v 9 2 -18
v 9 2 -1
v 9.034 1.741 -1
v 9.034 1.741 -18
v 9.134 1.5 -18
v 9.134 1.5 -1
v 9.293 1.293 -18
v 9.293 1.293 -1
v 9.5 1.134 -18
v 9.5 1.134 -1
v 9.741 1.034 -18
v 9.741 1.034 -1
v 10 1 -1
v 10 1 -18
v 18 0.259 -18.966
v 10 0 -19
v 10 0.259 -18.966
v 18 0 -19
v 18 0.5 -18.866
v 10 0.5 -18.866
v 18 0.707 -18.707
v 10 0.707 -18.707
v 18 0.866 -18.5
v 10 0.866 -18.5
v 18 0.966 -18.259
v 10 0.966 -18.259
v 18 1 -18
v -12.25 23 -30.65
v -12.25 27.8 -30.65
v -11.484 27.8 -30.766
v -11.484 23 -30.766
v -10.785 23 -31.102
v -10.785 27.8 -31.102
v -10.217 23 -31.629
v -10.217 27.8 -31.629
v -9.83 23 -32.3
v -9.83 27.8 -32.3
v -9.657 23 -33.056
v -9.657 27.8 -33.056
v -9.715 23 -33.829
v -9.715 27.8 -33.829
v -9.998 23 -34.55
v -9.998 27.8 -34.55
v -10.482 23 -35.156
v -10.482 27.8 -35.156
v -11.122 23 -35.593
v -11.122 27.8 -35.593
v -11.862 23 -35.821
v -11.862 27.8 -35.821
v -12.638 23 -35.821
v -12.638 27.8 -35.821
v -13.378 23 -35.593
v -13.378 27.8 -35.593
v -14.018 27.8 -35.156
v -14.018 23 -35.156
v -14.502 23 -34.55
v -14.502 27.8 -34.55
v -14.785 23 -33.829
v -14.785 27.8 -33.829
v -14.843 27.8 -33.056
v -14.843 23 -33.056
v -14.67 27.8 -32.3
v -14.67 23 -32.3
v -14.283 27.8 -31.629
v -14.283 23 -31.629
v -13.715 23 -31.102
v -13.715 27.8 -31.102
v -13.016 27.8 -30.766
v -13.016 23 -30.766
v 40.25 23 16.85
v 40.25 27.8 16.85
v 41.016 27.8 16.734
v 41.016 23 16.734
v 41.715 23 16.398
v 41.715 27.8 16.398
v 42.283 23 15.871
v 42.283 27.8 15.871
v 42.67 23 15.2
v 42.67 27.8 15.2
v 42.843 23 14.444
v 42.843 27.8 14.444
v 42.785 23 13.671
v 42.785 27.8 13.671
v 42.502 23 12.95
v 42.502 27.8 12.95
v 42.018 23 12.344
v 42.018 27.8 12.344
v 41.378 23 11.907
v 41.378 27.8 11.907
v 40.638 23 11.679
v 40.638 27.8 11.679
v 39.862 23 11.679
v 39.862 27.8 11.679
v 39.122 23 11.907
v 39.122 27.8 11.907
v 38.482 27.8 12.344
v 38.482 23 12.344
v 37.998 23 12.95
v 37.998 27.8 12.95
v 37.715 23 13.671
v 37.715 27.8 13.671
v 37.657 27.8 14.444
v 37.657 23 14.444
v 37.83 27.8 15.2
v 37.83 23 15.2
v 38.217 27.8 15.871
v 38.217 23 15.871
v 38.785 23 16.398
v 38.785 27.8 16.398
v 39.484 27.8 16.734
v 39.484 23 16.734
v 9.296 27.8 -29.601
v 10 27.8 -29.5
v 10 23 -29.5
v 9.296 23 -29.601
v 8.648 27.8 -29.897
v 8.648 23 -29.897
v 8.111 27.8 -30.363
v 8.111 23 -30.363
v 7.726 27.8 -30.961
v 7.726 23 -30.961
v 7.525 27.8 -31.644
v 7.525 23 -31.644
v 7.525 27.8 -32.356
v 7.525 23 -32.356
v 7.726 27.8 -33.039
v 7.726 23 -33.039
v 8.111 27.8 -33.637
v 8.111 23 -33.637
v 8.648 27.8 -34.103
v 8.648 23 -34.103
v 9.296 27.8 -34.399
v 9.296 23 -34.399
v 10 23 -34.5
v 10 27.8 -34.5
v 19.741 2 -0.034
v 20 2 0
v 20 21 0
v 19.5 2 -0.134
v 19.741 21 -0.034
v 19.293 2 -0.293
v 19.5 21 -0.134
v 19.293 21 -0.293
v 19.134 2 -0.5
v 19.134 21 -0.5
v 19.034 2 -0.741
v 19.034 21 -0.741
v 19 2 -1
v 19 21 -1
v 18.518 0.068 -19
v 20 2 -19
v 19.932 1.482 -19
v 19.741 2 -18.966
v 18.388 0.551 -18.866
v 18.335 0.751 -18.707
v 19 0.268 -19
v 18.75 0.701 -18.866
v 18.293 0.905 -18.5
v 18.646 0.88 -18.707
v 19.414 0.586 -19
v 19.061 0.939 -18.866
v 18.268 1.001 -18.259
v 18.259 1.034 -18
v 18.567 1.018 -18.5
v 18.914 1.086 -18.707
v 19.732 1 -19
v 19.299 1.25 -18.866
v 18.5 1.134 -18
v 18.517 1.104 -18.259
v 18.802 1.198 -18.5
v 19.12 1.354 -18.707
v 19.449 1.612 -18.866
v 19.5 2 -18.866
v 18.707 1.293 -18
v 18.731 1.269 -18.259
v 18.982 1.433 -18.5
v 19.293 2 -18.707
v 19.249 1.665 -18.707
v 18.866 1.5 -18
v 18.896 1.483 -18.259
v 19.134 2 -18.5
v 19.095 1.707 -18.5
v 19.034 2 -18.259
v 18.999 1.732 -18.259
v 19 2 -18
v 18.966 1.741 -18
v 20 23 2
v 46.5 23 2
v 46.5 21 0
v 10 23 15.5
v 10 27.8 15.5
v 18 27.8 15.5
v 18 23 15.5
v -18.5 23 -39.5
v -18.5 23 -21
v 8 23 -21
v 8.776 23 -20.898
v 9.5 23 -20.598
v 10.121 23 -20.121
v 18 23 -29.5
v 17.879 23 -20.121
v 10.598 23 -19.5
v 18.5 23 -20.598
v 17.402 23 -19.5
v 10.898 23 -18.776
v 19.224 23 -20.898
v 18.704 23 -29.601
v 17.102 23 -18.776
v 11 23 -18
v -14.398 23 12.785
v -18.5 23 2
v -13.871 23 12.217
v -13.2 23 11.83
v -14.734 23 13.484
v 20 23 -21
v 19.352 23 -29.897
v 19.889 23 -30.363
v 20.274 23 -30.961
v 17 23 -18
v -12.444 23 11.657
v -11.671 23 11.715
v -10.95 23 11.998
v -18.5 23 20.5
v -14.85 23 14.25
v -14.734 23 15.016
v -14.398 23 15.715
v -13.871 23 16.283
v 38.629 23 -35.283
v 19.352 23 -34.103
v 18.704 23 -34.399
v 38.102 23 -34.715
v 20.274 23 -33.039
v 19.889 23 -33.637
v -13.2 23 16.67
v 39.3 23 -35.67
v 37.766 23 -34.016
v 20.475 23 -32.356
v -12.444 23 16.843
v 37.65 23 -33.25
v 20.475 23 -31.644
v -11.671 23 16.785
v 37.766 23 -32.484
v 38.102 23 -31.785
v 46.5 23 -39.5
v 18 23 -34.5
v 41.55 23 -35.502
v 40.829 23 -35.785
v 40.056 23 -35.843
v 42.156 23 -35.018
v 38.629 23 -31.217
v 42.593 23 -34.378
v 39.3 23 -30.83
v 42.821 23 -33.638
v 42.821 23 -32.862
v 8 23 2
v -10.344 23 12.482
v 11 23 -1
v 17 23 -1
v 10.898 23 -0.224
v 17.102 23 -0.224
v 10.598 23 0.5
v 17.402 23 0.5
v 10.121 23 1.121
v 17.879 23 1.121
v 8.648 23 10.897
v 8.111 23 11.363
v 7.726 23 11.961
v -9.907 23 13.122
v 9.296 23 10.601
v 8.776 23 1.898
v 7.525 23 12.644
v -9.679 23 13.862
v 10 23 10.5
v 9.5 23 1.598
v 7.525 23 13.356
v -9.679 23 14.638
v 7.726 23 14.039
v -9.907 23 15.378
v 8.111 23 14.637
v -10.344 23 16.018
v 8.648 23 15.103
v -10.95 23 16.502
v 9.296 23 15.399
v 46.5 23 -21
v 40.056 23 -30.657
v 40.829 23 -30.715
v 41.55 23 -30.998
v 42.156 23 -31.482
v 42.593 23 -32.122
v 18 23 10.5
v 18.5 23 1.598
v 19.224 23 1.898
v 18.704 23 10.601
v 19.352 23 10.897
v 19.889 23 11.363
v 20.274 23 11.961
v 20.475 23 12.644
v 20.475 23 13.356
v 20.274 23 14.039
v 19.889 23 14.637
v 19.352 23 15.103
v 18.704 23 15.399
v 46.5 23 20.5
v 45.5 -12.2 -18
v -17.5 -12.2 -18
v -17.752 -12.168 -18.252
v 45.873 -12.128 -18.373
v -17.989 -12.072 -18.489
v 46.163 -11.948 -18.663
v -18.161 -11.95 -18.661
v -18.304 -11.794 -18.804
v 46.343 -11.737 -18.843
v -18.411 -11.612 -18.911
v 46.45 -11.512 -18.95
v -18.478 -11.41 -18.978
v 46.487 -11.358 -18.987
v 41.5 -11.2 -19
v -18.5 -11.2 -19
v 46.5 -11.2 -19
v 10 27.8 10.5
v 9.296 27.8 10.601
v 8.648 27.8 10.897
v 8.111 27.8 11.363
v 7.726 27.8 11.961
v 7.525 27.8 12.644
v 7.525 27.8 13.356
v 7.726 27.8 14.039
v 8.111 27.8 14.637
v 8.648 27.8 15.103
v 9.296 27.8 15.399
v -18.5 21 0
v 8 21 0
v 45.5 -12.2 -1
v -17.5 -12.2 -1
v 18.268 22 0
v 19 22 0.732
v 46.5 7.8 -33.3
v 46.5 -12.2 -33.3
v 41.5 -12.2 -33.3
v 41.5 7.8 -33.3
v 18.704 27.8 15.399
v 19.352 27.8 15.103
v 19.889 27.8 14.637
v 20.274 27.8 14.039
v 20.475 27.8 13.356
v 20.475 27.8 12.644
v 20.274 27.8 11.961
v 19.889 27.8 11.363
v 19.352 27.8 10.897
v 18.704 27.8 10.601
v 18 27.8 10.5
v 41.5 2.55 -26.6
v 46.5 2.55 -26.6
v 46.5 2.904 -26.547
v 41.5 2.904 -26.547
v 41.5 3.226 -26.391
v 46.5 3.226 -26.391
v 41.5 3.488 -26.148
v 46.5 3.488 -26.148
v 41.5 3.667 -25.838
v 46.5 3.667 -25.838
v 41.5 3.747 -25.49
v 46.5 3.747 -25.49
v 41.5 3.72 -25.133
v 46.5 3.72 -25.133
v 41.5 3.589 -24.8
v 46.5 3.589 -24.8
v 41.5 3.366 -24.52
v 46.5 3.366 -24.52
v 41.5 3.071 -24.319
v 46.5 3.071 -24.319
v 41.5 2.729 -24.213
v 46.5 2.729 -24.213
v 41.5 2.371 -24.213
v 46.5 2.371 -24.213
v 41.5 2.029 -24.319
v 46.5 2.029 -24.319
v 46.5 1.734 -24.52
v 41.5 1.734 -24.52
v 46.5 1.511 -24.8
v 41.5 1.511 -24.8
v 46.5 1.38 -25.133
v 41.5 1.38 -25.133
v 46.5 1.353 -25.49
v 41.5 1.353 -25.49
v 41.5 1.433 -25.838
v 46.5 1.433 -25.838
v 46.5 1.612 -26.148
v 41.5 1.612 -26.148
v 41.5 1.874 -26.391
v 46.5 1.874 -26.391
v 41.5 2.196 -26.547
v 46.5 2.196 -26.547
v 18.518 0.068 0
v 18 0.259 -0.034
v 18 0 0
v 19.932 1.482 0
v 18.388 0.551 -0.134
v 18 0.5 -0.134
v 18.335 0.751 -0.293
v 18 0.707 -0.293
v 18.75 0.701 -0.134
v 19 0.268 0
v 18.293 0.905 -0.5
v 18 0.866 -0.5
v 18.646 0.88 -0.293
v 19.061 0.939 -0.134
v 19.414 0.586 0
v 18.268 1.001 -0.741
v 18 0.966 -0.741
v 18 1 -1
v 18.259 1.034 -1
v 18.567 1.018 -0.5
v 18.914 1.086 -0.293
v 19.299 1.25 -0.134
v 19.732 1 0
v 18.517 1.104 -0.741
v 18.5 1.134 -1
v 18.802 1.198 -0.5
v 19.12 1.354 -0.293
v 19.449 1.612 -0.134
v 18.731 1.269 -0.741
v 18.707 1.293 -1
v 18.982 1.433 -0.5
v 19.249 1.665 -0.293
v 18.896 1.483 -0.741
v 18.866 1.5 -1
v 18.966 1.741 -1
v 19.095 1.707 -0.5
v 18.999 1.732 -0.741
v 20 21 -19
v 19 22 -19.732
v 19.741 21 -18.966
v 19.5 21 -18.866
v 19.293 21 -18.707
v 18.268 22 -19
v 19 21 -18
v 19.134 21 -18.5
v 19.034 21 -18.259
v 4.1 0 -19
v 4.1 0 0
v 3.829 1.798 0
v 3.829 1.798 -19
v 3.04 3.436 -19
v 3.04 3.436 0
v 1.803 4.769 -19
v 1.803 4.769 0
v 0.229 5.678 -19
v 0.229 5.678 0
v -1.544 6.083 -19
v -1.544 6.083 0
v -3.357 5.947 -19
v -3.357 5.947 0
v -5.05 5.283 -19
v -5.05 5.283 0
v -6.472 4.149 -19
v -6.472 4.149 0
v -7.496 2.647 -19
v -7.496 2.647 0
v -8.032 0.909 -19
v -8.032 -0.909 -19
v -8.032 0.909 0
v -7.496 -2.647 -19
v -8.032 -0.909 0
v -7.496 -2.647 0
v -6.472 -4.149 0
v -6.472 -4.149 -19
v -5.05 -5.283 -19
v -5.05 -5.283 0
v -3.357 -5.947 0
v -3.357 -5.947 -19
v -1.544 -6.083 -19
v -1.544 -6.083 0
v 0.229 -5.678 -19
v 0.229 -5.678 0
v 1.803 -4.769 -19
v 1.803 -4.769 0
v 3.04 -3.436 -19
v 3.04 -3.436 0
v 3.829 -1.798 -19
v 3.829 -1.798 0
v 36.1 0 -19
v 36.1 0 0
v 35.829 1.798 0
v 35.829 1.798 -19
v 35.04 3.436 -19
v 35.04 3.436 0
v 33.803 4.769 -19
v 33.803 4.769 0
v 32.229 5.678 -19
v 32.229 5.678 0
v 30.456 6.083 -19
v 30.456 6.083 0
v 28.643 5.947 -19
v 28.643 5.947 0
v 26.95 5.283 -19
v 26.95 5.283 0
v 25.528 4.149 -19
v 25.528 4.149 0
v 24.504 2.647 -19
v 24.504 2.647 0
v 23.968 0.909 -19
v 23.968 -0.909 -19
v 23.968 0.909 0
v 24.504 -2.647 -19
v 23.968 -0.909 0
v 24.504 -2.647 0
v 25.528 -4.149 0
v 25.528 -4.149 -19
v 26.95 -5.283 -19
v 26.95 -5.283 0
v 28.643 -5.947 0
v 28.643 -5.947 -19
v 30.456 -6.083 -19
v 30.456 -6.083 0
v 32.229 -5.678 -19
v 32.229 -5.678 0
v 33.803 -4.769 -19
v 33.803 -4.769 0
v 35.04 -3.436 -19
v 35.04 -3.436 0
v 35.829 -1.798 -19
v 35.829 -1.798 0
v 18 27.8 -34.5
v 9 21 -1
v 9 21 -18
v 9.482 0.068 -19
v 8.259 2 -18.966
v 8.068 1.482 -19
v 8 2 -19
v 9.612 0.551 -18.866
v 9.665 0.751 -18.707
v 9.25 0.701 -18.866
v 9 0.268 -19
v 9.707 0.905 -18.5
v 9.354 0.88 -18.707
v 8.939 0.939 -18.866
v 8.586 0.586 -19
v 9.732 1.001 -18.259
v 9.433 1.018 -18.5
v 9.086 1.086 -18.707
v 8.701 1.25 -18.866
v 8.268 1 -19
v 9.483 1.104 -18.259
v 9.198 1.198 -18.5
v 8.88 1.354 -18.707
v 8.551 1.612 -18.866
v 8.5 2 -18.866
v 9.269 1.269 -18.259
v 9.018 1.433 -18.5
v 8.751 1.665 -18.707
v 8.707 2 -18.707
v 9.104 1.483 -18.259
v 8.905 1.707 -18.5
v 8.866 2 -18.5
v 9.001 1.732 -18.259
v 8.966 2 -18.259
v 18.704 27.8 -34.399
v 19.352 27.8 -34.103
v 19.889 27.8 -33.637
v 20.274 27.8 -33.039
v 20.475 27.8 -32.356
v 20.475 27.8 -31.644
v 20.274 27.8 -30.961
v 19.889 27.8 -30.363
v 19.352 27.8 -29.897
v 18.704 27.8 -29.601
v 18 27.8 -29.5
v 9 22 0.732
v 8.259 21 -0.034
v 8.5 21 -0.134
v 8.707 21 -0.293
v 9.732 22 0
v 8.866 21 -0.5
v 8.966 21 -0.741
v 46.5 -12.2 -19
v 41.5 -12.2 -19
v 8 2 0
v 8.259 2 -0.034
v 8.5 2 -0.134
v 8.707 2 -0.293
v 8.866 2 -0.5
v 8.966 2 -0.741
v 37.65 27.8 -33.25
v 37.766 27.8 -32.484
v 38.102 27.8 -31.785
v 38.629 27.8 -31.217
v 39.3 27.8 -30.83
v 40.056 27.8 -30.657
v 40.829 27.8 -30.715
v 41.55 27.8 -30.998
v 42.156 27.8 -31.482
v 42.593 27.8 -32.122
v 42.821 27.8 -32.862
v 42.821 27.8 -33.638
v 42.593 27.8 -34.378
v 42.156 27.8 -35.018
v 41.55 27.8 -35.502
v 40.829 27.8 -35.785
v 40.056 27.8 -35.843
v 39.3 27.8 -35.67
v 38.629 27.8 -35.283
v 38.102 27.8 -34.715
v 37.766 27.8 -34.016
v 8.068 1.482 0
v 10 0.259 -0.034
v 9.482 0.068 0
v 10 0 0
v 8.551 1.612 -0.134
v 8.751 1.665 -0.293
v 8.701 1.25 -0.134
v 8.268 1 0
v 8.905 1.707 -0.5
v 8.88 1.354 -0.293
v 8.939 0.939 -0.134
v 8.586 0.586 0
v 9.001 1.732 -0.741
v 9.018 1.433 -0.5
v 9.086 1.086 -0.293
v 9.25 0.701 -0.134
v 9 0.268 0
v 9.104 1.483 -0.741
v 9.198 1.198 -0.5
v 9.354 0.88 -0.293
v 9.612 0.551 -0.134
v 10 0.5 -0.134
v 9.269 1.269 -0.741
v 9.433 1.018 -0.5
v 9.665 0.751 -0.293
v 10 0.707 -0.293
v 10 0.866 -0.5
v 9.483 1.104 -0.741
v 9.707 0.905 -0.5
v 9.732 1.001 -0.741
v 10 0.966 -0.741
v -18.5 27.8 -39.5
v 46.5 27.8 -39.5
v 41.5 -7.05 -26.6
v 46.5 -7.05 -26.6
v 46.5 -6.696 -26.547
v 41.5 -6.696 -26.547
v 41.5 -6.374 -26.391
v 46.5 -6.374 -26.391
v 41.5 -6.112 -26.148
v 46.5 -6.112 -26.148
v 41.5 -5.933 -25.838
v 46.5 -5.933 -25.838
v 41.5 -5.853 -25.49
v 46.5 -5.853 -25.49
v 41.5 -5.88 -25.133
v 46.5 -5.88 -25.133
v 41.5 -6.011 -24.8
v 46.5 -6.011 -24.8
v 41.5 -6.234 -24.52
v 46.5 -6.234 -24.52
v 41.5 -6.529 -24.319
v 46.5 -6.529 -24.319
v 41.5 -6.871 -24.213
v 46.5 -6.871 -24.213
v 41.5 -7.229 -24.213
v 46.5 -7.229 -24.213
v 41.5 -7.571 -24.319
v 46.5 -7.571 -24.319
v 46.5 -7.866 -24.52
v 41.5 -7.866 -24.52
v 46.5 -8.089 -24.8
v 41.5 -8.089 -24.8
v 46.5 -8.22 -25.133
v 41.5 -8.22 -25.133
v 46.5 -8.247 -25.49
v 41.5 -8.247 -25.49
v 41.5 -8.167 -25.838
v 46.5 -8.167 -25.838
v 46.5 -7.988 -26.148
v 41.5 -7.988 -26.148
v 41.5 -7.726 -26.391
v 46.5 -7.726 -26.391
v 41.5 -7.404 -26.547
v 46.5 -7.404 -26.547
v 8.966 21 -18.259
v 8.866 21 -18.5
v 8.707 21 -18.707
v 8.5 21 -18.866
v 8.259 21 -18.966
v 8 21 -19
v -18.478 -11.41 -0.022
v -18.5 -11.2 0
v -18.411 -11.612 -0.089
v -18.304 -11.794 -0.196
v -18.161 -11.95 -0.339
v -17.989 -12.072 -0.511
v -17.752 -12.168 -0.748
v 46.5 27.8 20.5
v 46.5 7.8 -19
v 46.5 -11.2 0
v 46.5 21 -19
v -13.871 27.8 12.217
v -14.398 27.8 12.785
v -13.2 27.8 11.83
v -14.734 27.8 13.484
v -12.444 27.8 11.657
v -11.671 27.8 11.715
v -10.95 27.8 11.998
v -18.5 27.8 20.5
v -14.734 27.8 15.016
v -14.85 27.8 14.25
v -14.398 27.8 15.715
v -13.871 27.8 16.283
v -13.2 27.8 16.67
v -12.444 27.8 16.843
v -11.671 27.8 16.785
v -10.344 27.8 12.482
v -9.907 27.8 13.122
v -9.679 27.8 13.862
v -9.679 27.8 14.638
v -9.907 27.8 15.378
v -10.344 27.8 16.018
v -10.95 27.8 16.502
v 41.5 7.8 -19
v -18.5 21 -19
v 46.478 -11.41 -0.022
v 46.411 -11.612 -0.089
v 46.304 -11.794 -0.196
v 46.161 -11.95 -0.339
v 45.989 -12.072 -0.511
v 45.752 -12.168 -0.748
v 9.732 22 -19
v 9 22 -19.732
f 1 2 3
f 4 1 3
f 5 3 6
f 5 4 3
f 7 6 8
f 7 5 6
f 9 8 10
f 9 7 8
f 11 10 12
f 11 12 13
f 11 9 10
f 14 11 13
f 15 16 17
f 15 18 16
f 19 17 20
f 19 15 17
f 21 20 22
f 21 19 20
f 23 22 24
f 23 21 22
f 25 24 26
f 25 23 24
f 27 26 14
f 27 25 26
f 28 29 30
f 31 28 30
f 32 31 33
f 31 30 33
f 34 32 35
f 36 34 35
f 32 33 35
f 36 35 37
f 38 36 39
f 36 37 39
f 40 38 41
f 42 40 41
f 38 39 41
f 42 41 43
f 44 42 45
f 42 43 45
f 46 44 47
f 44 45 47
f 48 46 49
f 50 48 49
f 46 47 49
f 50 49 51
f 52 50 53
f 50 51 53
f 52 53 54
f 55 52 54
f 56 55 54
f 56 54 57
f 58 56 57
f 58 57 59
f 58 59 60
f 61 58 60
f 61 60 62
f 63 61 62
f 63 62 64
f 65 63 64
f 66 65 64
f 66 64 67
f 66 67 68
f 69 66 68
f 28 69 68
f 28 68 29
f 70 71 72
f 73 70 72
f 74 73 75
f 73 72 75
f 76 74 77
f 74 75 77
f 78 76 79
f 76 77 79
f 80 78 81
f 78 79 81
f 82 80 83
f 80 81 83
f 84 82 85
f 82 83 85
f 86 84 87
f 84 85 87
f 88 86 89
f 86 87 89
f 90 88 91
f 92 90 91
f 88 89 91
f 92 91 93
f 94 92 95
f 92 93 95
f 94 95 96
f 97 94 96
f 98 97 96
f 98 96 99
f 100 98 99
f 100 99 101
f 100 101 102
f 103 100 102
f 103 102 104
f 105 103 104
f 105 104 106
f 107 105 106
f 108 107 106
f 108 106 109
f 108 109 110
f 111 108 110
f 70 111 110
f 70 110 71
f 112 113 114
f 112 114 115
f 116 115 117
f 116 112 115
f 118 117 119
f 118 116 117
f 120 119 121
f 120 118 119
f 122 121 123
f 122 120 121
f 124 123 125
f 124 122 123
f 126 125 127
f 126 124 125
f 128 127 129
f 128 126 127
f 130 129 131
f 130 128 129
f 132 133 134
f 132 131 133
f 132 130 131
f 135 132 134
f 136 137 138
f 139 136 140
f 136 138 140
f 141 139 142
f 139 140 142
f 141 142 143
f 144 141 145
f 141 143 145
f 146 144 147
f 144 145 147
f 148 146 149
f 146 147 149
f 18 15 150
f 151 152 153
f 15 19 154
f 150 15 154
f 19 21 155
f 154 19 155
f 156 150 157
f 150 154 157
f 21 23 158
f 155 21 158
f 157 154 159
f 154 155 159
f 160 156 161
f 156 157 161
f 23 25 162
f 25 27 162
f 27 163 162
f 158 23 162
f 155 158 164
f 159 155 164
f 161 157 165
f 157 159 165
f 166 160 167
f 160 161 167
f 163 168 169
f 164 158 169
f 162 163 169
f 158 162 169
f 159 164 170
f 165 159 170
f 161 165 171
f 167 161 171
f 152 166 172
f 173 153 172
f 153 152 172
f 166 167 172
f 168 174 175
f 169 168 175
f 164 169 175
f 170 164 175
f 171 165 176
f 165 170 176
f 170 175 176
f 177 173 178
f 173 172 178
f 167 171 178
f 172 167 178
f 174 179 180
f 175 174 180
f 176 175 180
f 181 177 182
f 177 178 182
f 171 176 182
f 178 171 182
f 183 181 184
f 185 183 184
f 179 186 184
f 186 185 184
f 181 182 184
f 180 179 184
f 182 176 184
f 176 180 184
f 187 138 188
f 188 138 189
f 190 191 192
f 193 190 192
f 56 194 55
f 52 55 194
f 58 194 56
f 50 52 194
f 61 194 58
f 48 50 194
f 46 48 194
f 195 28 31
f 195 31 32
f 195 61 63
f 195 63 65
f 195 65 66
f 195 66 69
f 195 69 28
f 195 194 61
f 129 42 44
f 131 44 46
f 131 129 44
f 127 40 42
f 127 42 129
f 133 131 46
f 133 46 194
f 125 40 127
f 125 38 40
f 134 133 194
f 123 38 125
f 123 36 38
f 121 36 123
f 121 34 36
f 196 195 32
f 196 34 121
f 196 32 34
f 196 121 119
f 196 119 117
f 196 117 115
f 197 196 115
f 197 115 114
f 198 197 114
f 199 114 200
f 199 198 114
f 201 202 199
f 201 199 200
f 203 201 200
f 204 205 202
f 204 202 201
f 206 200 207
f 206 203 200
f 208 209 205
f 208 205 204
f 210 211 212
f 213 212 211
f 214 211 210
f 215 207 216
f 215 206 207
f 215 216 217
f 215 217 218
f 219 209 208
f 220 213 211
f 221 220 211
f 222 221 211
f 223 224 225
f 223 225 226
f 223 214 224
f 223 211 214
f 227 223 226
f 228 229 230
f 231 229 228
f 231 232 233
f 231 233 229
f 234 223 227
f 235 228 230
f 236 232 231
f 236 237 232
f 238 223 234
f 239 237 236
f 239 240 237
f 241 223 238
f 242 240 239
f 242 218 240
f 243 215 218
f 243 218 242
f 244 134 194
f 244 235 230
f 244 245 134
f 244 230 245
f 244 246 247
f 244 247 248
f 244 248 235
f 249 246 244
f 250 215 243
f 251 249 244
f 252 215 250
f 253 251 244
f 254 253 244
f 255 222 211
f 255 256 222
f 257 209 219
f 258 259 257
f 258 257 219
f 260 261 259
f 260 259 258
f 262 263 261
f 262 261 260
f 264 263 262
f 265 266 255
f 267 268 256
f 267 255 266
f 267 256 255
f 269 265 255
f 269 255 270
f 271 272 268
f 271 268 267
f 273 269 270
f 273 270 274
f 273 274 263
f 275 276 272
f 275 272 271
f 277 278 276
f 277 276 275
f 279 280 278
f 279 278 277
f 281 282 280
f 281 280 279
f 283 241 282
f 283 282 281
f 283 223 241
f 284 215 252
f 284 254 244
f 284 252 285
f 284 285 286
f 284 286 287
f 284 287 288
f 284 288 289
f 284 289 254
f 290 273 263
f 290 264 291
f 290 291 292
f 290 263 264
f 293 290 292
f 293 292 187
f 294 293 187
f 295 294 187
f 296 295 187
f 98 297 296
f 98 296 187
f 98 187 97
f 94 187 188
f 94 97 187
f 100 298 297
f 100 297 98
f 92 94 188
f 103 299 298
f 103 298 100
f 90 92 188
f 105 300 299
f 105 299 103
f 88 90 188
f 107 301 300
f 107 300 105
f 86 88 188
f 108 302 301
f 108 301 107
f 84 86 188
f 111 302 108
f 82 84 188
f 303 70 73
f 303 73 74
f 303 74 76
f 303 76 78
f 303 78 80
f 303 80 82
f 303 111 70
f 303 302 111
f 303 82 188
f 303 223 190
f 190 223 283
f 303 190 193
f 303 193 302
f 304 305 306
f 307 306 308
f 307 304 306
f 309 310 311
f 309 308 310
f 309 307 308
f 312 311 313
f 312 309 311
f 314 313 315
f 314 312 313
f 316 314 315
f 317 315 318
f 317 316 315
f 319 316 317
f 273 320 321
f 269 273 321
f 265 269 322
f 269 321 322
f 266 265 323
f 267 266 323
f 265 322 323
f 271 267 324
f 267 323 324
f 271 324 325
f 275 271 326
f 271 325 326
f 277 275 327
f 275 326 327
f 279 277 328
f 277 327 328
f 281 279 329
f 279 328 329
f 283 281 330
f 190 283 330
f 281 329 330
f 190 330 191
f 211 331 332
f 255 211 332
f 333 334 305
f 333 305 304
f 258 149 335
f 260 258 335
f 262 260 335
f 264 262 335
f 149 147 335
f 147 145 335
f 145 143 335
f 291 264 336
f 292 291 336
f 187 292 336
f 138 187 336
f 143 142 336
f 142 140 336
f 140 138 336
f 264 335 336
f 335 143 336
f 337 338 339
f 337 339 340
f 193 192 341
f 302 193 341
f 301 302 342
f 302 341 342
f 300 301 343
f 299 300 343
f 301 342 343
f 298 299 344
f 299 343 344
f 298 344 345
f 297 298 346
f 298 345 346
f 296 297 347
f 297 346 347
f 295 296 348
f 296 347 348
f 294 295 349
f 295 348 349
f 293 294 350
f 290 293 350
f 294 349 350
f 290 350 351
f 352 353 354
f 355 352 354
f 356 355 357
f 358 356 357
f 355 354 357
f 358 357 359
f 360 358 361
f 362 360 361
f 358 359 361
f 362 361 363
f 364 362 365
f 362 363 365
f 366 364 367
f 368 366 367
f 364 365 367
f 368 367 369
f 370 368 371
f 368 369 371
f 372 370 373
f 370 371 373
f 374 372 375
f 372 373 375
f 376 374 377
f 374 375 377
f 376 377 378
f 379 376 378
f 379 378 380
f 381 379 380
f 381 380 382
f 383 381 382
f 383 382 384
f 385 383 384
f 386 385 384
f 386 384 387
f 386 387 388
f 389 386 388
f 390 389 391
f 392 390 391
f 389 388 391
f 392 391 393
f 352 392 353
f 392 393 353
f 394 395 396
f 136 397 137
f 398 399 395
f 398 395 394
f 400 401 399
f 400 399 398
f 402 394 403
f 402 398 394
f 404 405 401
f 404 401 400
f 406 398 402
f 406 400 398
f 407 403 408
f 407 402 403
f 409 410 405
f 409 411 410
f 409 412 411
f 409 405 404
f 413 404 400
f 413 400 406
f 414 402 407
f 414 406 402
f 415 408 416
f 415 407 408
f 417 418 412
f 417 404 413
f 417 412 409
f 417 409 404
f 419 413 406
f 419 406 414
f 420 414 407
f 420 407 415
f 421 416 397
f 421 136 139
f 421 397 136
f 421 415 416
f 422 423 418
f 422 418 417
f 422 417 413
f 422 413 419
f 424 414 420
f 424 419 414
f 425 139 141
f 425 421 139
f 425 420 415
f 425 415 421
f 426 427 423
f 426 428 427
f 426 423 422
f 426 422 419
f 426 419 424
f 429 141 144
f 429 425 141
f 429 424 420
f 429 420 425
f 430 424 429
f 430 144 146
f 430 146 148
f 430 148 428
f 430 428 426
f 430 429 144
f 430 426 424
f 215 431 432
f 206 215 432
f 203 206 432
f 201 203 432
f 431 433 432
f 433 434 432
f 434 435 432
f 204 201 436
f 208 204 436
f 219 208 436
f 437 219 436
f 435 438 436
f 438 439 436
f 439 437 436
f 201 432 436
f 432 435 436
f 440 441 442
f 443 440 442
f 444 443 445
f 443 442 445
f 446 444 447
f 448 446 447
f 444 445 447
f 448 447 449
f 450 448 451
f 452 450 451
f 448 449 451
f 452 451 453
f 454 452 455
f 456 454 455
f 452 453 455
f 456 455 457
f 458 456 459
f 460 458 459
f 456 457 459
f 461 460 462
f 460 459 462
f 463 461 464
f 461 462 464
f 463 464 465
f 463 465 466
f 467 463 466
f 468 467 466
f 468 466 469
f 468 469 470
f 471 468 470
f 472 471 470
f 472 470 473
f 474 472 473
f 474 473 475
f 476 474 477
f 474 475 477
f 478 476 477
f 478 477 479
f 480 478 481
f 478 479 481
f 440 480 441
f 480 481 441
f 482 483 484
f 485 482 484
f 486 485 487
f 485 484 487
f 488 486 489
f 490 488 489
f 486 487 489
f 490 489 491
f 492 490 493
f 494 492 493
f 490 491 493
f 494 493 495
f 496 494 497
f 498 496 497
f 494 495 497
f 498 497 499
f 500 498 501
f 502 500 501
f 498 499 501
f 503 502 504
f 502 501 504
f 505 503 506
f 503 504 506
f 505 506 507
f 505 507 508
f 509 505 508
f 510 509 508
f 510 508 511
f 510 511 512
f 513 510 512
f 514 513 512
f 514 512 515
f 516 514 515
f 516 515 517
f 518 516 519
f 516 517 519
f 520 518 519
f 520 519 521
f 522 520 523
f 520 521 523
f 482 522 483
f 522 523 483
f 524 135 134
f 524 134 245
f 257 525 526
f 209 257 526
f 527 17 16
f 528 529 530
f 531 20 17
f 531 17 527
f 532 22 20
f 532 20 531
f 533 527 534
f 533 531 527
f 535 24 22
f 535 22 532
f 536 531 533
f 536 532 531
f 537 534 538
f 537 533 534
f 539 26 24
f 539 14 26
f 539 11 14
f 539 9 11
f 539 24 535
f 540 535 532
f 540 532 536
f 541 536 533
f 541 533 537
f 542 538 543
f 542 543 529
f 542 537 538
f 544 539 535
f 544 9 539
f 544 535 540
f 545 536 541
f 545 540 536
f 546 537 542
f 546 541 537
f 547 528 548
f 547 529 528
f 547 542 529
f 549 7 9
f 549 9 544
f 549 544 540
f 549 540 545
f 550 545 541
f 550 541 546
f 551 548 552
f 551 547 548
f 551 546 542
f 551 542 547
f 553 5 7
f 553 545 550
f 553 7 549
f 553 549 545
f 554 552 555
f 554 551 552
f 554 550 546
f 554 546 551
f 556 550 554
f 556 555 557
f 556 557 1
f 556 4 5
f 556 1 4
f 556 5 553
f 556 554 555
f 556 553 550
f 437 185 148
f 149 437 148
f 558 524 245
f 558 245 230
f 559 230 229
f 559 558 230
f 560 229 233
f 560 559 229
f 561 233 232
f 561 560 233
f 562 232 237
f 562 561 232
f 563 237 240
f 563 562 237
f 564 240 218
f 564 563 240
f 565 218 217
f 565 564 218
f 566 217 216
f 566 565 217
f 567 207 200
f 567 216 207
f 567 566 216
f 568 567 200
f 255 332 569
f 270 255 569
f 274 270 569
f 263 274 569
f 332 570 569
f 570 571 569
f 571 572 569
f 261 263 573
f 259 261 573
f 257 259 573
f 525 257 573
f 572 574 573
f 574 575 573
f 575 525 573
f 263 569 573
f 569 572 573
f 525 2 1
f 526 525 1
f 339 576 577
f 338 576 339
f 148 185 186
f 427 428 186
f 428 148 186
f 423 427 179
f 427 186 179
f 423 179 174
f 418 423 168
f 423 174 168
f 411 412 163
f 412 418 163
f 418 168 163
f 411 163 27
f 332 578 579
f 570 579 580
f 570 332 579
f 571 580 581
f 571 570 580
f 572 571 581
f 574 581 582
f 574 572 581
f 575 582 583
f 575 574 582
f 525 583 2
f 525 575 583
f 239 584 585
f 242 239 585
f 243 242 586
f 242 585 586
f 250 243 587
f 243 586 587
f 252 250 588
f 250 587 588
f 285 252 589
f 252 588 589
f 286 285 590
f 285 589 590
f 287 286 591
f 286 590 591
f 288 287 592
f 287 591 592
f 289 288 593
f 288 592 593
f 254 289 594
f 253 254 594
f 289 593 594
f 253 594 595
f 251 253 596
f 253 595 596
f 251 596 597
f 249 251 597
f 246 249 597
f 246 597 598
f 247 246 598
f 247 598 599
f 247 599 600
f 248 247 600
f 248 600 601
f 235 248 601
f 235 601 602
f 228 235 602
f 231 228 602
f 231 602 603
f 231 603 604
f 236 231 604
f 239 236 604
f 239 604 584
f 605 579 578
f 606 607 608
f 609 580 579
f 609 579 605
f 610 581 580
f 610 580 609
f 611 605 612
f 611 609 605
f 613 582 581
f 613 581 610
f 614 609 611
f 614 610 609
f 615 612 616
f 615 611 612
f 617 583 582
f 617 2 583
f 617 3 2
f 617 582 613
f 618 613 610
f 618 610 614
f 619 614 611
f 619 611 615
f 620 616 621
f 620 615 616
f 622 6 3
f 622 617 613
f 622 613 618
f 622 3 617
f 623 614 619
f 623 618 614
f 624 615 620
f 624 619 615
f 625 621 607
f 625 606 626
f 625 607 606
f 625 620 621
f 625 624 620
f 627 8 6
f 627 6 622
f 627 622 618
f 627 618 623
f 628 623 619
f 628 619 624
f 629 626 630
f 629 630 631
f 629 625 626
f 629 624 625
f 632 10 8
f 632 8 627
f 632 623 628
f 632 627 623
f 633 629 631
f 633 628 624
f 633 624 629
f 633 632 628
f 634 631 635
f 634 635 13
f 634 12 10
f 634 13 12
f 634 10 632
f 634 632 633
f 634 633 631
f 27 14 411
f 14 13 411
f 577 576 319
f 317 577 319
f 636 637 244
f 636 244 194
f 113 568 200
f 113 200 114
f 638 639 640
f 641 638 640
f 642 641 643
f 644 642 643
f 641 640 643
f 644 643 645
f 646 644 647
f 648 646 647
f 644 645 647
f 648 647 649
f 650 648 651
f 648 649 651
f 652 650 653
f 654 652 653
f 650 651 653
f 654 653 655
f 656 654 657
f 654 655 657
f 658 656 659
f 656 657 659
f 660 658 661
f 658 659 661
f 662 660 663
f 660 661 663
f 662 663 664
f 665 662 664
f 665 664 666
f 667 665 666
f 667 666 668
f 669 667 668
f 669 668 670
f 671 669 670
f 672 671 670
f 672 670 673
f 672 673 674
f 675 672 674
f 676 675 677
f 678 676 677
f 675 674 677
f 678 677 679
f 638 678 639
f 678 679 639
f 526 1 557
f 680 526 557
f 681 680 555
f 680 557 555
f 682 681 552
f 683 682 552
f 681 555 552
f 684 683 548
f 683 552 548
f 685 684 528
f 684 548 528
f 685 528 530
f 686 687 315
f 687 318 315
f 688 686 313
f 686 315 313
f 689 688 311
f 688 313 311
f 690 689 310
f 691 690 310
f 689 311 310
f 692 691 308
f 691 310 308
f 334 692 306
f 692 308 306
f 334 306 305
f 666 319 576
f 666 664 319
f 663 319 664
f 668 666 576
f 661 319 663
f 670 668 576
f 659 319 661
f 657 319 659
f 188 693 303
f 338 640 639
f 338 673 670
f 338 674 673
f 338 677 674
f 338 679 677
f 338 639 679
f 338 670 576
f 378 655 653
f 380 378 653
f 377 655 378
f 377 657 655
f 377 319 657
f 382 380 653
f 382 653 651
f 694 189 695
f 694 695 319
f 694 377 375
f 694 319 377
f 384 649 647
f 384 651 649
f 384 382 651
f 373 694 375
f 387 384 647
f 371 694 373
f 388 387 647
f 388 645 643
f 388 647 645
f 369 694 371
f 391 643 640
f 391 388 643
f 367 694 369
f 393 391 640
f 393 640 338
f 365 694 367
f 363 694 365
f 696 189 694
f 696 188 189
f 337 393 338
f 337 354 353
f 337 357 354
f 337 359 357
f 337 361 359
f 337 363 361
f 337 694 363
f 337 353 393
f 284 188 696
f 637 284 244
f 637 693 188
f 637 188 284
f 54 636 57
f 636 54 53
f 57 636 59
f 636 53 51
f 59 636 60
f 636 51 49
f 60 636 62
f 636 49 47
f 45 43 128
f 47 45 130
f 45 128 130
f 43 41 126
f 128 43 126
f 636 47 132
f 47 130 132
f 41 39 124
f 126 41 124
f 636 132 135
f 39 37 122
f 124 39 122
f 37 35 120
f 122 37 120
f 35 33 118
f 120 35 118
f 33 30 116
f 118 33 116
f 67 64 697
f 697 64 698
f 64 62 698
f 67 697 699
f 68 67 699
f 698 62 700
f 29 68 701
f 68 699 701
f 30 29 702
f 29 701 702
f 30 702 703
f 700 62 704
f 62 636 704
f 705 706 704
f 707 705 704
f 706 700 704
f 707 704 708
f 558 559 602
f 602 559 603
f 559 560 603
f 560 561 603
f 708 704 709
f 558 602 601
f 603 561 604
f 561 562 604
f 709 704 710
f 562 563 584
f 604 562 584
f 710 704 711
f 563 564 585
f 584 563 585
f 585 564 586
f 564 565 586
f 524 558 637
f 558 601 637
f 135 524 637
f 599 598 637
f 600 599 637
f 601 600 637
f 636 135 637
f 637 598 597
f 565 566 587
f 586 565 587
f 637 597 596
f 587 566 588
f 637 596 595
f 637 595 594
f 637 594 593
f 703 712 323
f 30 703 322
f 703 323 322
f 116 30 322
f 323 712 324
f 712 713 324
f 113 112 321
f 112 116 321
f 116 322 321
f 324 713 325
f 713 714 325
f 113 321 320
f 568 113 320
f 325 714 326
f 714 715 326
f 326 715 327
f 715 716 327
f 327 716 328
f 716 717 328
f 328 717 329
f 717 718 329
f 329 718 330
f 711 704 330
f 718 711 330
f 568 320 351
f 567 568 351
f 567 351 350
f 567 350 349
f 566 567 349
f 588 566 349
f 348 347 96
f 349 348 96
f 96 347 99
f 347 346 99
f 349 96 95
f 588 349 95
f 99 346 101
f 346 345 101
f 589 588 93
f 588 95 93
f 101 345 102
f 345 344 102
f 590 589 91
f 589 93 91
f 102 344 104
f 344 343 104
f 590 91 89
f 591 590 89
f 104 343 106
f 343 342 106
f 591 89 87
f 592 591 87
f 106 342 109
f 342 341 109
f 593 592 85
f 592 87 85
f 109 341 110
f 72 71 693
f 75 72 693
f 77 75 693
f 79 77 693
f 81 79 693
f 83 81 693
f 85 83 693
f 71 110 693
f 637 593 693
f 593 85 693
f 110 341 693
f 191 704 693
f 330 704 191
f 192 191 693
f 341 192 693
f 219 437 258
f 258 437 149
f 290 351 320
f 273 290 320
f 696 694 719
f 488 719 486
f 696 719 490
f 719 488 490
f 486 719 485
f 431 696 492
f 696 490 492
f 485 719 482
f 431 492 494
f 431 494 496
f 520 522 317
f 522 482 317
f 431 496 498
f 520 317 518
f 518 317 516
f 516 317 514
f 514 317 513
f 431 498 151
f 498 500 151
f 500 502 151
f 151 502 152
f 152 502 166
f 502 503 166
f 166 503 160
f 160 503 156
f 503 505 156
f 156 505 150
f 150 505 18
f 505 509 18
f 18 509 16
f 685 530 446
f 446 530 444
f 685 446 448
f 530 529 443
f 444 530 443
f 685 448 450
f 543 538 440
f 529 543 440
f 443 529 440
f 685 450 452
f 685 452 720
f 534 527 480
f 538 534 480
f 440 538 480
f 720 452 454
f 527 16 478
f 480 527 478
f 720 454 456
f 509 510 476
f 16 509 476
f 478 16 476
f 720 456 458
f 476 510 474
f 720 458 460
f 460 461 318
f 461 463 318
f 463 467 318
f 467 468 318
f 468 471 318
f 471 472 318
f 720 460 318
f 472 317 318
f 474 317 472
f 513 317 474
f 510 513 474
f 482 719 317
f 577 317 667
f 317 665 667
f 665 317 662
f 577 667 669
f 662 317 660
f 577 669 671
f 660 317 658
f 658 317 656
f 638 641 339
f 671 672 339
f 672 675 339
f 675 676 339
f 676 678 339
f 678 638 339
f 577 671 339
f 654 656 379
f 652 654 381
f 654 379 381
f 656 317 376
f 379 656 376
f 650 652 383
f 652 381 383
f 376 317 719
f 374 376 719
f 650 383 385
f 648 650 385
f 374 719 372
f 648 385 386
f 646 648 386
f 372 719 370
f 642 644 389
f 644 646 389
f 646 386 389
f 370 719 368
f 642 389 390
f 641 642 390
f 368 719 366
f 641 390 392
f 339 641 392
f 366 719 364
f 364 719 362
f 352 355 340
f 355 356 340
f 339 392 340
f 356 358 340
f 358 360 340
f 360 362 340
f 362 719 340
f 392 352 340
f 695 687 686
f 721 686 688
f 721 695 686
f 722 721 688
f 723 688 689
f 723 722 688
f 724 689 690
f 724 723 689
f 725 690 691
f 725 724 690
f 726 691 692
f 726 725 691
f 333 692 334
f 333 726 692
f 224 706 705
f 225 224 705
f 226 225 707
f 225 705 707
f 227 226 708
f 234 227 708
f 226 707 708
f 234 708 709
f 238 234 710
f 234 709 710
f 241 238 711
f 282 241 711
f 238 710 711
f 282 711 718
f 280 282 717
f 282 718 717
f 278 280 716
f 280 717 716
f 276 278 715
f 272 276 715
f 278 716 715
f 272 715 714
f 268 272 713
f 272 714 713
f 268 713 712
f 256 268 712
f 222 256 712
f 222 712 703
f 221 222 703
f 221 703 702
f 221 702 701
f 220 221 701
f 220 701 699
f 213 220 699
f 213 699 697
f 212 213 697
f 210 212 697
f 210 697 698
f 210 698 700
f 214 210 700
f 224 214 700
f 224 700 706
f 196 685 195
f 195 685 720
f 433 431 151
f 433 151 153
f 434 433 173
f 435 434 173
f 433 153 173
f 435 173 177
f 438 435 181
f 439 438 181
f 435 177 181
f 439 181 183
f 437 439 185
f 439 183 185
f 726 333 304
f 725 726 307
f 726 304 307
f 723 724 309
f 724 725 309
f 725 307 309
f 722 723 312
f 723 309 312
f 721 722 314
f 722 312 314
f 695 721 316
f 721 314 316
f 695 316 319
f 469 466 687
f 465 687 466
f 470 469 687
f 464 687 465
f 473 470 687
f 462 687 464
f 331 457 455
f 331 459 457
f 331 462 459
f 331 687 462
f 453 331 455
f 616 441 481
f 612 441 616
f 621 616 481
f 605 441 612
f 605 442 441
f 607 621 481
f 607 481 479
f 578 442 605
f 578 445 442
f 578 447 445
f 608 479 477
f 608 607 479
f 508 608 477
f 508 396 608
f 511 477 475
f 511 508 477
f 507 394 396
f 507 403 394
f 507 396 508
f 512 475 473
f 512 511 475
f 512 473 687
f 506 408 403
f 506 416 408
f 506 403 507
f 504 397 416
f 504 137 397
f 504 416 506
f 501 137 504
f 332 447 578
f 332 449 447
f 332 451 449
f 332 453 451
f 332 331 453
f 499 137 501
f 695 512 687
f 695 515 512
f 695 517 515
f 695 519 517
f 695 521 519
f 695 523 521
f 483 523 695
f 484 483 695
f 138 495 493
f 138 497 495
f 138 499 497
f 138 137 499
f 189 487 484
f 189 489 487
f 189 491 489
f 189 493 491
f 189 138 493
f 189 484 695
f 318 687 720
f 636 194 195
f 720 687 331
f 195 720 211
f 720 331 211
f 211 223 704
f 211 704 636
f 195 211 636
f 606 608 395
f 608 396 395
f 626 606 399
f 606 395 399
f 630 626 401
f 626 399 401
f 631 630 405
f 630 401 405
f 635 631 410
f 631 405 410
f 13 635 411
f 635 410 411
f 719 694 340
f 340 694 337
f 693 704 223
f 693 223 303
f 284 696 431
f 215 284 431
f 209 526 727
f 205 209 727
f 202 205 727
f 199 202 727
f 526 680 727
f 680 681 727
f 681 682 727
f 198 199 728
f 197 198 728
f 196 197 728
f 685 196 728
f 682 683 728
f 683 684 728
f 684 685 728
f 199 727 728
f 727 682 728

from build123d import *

# Parameters (mm, degrees)
SKETCH1_W           = 65
SKETCH1_H           = 40
SKETCH1_R           = 6.1
BOSS_EXTRUDE1_DEPTH = 19
SKETCH4_W           = 65
SKETCH4_H           = 14.8
BOSS_EXTRUDE2_DEPTH = 35
SKETCH6_W           = 10
SKETCH6_H           = 12
CUT_EXTRUDE1_DEPTH  = 71.109485806
CUT_EXTRUDE3_DEPTH  = 76.779284768
FILLET1_R           = 1
SKETCH9_W           = 65
SKETCH9_H           = 14.8
CUT_EXTRUDE4_DEPTH  = 5
SKETCH10_W          = 65
SKETCH10_H          = 14.8
CUT_EXTRUDE5_DEPTH  = 5
SKETCH11_R          = 2.6
CUT_EXTRUDE6_DEPTH  = 73.955465868
CUT_EXTRUDE7_DEPTH  = 10
CHAMFER1_SIZE       = 2
SKETCH13_W          = 14.3
SKETCH13_H          = 20
SKETCH13_R          = 1.2
BOSS_EXTRUDE3_DEPTH = 5


with BuildPart() as part:
    # Sketch1 → Boss-Extrude1 (new body)
    with BuildSketch(Plane.XY):
        with Locations((14, 7.8)):
            Rectangle(SKETCH1_W, SKETCH1_H)
        with Locations((-2, 0)):
            Circle(SKETCH1_R, mode=Mode.SUBTRACT)
        with Locations((30, 0)):
            Circle(SKETCH1_R, mode=Mode.SUBTRACT)
    extrude(amount=-BOSS_EXTRUDE1_DEPTH)

    # Sketch4 → Boss-Extrude2 (add, symmetric)
    with BuildSketch(Plane.XY.offset(-9.5)):
        with Locations((14, 20.4)):
            Rectangle(SKETCH4_W, SKETCH4_H)
    extrude(amount=BOSS_EXTRUDE2_DEPTH, both=True)

    # Sketch6 → Cut-Extrude1 (cut, through all)
    with BuildSketch(Plane.XY):
        with Locations((14, 7)):
            Rectangle(SKETCH6_W, SKETCH6_H)
    extrude(amount=-CUT_EXTRUDE1_DEPTH, mode=Mode.SUBTRACT)

    # Sketch8 → Cut-Extrude3 (cut, through all)
    with BuildSketch(Plane(origin=(0, 27.8, 0), x_dir=(1, 0, 0), z_dir=(0, 1, 0))):
        with BuildLine():
            Line((18, 29.5), (10, 29.5))
            ThreePointArc((10, 29.5), (7.5, 32), (10, 34.5))
            Line((10, 34.5), (18, 34.5))
            ThreePointArc((18, 34.5), (20.5, 32), (18, 29.5))
        make_face()
        with BuildLine():
            Line((18, -10.5), (10, -10.5))
            ThreePointArc((10, -10.5), (7.5, -13), (10, -15.5))
            Line((10, -15.5), (18, -15.5))
            ThreePointArc((18, -15.5), (20.5, -13), (18, -10.5))
        make_face()
    extrude(amount=-CUT_EXTRUDE3_DEPTH, mode=Mode.SUBTRACT)

    # Fillet1
    fillet1_edges = [part.edges().sort_by_distance(p)[0] for p in [
        (14, 1, -19),
        (9, 7, -19),
        (19, 7, -19),
        (9, 1, -9.5),
        (19, 1, -9.5),
        (9, 7, 0),
        (14, 1, 0),
        (19, 7, 0),
        (14, -12.2, 0),
        (46.5, -12.2, -9.5),
        (-18.5, -12.2, -9.5),
        (14, -12.2, -19),
    ]]
    fillet(fillet1_edges, radius=FILLET1_R)

    # Sketch9 → Cut-Extrude4 (cut)
    with BuildSketch(Plane.XY.offset(25.5)):
        with Locations((14, 20.4)):
            Rectangle(SKETCH9_W, SKETCH9_H)
    extrude(amount=-CUT_EXTRUDE4_DEPTH, mode=Mode.SUBTRACT)

    # Sketch10 → Cut-Extrude5 (cut)
    with BuildSketch(Plane(origin=(0, 0, -44.5), x_dir=(-1, 0, 0), z_dir=(0, 0, -1))):
        with Locations((-14, 20.4)):
            Rectangle(SKETCH10_W, SKETCH10_H)
    extrude(amount=-CUT_EXTRUDE5_DEPTH, mode=Mode.SUBTRACT)

    # Sketch11 → Cut-Extrude6 (cut, through all)
    with BuildSketch(Plane(origin=(0, 27.8, 0), x_dir=(1, 0, 0), z_dir=(0, 1, 0))):
        with Locations(Location((40.25, -14.25, 0), (0, 0, 270))):
            Circle(SKETCH11_R)
        with Locations(Location((40.25, 33.25, 0), (0, 0, 180))):
            Circle(SKETCH11_R)
        with Locations(Location((-12.25, 33.25, 0), (0, 0, 270))):
            Circle(SKETCH11_R)
        with Locations(Location((-12.25, -14.25, 0), (0, 0, 180))):
            Circle(SKETCH11_R)
    extrude(amount=-CUT_EXTRUDE6_DEPTH, mode=Mode.SUBTRACT)

    # Sketch12 → Cut-Extrude7 (cut)
    with BuildSketch(Plane.XZ.offset(-13)):
        with BuildLine():
            Line((-18.5, -39.5), (46.5, -39.5))
            Line((46.5, -39.5), (46.5, -19))
            Line((46.5, -19), (20, -19))
            ThreePointArc((20, -19), (19.292893219, -18.707106781), (19, -18))
            Line((19, -18), (19, -1))
            ThreePointArc((19, -1), (19.292893219, -0.292893219), (20, 0))
            Line((20, 0), (46.5, 0))
            Line((46.5, 0), (46.5, 20.5))
            Line((46.5, 20.5), (-18.5, 20.5))
            Line((-18.5, 20.5), (-18.5, 0))
            Line((-18.5, 0), (8, 0))
            ThreePointArc((8, 0), (8.707106781, -0.292893219), (9, -1))
            Line((9, -1), (9, -18))
            ThreePointArc((9, -18), (8.707106781, -18.707106781), (8, -19))
            Line((8, -19), (-18.5, -19))
            Line((-18.5, -19), (-18.5, -39.5))
        make_face()
    extrude(amount=-CUT_EXTRUDE7_DEPTH, mode=Mode.SUBTRACT)

    # Chamfer1
    chamfer1_edges = [part.edges().sort_by_distance(p)[0] for p in [
        (-5.25, 23, -19),
        (8.707106781, 23, -18.707106781),
        (9, 23, -9.5),
        (8.707106781, 23, -0.292893219),
        (-5.25, 23, 0),
        (33.25, 23, 0),
        (19.292893219, 23, -0.292893219),
        (19, 23, -9.5),
        (19.292893219, 23, -18.707106781),
        (33.25, 23, -19),
    ]]
    chamfer(chamfer1_edges, length=CHAMFER1_SIZE)

    # Sketch13 → Boss-Extrude3 (add)
    with BuildSketch(Plane(origin=(46.5, 0, 0), x_dir=(0, 0, -1), z_dir=(1, 0, 0))):
        with Locations((26.15, -2.2)):
            Rectangle(SKETCH13_W, SKETCH13_H)
        with Locations((25.4, 2.55)):
            Circle(SKETCH13_R, mode=Mode.SUBTRACT)
        with Locations((25.4, -7.05)):
            Circle(SKETCH13_R, mode=Mode.SUBTRACT)
    extrude(amount=-BOSS_EXTRUDE3_DEPTH)


solid = part.part
